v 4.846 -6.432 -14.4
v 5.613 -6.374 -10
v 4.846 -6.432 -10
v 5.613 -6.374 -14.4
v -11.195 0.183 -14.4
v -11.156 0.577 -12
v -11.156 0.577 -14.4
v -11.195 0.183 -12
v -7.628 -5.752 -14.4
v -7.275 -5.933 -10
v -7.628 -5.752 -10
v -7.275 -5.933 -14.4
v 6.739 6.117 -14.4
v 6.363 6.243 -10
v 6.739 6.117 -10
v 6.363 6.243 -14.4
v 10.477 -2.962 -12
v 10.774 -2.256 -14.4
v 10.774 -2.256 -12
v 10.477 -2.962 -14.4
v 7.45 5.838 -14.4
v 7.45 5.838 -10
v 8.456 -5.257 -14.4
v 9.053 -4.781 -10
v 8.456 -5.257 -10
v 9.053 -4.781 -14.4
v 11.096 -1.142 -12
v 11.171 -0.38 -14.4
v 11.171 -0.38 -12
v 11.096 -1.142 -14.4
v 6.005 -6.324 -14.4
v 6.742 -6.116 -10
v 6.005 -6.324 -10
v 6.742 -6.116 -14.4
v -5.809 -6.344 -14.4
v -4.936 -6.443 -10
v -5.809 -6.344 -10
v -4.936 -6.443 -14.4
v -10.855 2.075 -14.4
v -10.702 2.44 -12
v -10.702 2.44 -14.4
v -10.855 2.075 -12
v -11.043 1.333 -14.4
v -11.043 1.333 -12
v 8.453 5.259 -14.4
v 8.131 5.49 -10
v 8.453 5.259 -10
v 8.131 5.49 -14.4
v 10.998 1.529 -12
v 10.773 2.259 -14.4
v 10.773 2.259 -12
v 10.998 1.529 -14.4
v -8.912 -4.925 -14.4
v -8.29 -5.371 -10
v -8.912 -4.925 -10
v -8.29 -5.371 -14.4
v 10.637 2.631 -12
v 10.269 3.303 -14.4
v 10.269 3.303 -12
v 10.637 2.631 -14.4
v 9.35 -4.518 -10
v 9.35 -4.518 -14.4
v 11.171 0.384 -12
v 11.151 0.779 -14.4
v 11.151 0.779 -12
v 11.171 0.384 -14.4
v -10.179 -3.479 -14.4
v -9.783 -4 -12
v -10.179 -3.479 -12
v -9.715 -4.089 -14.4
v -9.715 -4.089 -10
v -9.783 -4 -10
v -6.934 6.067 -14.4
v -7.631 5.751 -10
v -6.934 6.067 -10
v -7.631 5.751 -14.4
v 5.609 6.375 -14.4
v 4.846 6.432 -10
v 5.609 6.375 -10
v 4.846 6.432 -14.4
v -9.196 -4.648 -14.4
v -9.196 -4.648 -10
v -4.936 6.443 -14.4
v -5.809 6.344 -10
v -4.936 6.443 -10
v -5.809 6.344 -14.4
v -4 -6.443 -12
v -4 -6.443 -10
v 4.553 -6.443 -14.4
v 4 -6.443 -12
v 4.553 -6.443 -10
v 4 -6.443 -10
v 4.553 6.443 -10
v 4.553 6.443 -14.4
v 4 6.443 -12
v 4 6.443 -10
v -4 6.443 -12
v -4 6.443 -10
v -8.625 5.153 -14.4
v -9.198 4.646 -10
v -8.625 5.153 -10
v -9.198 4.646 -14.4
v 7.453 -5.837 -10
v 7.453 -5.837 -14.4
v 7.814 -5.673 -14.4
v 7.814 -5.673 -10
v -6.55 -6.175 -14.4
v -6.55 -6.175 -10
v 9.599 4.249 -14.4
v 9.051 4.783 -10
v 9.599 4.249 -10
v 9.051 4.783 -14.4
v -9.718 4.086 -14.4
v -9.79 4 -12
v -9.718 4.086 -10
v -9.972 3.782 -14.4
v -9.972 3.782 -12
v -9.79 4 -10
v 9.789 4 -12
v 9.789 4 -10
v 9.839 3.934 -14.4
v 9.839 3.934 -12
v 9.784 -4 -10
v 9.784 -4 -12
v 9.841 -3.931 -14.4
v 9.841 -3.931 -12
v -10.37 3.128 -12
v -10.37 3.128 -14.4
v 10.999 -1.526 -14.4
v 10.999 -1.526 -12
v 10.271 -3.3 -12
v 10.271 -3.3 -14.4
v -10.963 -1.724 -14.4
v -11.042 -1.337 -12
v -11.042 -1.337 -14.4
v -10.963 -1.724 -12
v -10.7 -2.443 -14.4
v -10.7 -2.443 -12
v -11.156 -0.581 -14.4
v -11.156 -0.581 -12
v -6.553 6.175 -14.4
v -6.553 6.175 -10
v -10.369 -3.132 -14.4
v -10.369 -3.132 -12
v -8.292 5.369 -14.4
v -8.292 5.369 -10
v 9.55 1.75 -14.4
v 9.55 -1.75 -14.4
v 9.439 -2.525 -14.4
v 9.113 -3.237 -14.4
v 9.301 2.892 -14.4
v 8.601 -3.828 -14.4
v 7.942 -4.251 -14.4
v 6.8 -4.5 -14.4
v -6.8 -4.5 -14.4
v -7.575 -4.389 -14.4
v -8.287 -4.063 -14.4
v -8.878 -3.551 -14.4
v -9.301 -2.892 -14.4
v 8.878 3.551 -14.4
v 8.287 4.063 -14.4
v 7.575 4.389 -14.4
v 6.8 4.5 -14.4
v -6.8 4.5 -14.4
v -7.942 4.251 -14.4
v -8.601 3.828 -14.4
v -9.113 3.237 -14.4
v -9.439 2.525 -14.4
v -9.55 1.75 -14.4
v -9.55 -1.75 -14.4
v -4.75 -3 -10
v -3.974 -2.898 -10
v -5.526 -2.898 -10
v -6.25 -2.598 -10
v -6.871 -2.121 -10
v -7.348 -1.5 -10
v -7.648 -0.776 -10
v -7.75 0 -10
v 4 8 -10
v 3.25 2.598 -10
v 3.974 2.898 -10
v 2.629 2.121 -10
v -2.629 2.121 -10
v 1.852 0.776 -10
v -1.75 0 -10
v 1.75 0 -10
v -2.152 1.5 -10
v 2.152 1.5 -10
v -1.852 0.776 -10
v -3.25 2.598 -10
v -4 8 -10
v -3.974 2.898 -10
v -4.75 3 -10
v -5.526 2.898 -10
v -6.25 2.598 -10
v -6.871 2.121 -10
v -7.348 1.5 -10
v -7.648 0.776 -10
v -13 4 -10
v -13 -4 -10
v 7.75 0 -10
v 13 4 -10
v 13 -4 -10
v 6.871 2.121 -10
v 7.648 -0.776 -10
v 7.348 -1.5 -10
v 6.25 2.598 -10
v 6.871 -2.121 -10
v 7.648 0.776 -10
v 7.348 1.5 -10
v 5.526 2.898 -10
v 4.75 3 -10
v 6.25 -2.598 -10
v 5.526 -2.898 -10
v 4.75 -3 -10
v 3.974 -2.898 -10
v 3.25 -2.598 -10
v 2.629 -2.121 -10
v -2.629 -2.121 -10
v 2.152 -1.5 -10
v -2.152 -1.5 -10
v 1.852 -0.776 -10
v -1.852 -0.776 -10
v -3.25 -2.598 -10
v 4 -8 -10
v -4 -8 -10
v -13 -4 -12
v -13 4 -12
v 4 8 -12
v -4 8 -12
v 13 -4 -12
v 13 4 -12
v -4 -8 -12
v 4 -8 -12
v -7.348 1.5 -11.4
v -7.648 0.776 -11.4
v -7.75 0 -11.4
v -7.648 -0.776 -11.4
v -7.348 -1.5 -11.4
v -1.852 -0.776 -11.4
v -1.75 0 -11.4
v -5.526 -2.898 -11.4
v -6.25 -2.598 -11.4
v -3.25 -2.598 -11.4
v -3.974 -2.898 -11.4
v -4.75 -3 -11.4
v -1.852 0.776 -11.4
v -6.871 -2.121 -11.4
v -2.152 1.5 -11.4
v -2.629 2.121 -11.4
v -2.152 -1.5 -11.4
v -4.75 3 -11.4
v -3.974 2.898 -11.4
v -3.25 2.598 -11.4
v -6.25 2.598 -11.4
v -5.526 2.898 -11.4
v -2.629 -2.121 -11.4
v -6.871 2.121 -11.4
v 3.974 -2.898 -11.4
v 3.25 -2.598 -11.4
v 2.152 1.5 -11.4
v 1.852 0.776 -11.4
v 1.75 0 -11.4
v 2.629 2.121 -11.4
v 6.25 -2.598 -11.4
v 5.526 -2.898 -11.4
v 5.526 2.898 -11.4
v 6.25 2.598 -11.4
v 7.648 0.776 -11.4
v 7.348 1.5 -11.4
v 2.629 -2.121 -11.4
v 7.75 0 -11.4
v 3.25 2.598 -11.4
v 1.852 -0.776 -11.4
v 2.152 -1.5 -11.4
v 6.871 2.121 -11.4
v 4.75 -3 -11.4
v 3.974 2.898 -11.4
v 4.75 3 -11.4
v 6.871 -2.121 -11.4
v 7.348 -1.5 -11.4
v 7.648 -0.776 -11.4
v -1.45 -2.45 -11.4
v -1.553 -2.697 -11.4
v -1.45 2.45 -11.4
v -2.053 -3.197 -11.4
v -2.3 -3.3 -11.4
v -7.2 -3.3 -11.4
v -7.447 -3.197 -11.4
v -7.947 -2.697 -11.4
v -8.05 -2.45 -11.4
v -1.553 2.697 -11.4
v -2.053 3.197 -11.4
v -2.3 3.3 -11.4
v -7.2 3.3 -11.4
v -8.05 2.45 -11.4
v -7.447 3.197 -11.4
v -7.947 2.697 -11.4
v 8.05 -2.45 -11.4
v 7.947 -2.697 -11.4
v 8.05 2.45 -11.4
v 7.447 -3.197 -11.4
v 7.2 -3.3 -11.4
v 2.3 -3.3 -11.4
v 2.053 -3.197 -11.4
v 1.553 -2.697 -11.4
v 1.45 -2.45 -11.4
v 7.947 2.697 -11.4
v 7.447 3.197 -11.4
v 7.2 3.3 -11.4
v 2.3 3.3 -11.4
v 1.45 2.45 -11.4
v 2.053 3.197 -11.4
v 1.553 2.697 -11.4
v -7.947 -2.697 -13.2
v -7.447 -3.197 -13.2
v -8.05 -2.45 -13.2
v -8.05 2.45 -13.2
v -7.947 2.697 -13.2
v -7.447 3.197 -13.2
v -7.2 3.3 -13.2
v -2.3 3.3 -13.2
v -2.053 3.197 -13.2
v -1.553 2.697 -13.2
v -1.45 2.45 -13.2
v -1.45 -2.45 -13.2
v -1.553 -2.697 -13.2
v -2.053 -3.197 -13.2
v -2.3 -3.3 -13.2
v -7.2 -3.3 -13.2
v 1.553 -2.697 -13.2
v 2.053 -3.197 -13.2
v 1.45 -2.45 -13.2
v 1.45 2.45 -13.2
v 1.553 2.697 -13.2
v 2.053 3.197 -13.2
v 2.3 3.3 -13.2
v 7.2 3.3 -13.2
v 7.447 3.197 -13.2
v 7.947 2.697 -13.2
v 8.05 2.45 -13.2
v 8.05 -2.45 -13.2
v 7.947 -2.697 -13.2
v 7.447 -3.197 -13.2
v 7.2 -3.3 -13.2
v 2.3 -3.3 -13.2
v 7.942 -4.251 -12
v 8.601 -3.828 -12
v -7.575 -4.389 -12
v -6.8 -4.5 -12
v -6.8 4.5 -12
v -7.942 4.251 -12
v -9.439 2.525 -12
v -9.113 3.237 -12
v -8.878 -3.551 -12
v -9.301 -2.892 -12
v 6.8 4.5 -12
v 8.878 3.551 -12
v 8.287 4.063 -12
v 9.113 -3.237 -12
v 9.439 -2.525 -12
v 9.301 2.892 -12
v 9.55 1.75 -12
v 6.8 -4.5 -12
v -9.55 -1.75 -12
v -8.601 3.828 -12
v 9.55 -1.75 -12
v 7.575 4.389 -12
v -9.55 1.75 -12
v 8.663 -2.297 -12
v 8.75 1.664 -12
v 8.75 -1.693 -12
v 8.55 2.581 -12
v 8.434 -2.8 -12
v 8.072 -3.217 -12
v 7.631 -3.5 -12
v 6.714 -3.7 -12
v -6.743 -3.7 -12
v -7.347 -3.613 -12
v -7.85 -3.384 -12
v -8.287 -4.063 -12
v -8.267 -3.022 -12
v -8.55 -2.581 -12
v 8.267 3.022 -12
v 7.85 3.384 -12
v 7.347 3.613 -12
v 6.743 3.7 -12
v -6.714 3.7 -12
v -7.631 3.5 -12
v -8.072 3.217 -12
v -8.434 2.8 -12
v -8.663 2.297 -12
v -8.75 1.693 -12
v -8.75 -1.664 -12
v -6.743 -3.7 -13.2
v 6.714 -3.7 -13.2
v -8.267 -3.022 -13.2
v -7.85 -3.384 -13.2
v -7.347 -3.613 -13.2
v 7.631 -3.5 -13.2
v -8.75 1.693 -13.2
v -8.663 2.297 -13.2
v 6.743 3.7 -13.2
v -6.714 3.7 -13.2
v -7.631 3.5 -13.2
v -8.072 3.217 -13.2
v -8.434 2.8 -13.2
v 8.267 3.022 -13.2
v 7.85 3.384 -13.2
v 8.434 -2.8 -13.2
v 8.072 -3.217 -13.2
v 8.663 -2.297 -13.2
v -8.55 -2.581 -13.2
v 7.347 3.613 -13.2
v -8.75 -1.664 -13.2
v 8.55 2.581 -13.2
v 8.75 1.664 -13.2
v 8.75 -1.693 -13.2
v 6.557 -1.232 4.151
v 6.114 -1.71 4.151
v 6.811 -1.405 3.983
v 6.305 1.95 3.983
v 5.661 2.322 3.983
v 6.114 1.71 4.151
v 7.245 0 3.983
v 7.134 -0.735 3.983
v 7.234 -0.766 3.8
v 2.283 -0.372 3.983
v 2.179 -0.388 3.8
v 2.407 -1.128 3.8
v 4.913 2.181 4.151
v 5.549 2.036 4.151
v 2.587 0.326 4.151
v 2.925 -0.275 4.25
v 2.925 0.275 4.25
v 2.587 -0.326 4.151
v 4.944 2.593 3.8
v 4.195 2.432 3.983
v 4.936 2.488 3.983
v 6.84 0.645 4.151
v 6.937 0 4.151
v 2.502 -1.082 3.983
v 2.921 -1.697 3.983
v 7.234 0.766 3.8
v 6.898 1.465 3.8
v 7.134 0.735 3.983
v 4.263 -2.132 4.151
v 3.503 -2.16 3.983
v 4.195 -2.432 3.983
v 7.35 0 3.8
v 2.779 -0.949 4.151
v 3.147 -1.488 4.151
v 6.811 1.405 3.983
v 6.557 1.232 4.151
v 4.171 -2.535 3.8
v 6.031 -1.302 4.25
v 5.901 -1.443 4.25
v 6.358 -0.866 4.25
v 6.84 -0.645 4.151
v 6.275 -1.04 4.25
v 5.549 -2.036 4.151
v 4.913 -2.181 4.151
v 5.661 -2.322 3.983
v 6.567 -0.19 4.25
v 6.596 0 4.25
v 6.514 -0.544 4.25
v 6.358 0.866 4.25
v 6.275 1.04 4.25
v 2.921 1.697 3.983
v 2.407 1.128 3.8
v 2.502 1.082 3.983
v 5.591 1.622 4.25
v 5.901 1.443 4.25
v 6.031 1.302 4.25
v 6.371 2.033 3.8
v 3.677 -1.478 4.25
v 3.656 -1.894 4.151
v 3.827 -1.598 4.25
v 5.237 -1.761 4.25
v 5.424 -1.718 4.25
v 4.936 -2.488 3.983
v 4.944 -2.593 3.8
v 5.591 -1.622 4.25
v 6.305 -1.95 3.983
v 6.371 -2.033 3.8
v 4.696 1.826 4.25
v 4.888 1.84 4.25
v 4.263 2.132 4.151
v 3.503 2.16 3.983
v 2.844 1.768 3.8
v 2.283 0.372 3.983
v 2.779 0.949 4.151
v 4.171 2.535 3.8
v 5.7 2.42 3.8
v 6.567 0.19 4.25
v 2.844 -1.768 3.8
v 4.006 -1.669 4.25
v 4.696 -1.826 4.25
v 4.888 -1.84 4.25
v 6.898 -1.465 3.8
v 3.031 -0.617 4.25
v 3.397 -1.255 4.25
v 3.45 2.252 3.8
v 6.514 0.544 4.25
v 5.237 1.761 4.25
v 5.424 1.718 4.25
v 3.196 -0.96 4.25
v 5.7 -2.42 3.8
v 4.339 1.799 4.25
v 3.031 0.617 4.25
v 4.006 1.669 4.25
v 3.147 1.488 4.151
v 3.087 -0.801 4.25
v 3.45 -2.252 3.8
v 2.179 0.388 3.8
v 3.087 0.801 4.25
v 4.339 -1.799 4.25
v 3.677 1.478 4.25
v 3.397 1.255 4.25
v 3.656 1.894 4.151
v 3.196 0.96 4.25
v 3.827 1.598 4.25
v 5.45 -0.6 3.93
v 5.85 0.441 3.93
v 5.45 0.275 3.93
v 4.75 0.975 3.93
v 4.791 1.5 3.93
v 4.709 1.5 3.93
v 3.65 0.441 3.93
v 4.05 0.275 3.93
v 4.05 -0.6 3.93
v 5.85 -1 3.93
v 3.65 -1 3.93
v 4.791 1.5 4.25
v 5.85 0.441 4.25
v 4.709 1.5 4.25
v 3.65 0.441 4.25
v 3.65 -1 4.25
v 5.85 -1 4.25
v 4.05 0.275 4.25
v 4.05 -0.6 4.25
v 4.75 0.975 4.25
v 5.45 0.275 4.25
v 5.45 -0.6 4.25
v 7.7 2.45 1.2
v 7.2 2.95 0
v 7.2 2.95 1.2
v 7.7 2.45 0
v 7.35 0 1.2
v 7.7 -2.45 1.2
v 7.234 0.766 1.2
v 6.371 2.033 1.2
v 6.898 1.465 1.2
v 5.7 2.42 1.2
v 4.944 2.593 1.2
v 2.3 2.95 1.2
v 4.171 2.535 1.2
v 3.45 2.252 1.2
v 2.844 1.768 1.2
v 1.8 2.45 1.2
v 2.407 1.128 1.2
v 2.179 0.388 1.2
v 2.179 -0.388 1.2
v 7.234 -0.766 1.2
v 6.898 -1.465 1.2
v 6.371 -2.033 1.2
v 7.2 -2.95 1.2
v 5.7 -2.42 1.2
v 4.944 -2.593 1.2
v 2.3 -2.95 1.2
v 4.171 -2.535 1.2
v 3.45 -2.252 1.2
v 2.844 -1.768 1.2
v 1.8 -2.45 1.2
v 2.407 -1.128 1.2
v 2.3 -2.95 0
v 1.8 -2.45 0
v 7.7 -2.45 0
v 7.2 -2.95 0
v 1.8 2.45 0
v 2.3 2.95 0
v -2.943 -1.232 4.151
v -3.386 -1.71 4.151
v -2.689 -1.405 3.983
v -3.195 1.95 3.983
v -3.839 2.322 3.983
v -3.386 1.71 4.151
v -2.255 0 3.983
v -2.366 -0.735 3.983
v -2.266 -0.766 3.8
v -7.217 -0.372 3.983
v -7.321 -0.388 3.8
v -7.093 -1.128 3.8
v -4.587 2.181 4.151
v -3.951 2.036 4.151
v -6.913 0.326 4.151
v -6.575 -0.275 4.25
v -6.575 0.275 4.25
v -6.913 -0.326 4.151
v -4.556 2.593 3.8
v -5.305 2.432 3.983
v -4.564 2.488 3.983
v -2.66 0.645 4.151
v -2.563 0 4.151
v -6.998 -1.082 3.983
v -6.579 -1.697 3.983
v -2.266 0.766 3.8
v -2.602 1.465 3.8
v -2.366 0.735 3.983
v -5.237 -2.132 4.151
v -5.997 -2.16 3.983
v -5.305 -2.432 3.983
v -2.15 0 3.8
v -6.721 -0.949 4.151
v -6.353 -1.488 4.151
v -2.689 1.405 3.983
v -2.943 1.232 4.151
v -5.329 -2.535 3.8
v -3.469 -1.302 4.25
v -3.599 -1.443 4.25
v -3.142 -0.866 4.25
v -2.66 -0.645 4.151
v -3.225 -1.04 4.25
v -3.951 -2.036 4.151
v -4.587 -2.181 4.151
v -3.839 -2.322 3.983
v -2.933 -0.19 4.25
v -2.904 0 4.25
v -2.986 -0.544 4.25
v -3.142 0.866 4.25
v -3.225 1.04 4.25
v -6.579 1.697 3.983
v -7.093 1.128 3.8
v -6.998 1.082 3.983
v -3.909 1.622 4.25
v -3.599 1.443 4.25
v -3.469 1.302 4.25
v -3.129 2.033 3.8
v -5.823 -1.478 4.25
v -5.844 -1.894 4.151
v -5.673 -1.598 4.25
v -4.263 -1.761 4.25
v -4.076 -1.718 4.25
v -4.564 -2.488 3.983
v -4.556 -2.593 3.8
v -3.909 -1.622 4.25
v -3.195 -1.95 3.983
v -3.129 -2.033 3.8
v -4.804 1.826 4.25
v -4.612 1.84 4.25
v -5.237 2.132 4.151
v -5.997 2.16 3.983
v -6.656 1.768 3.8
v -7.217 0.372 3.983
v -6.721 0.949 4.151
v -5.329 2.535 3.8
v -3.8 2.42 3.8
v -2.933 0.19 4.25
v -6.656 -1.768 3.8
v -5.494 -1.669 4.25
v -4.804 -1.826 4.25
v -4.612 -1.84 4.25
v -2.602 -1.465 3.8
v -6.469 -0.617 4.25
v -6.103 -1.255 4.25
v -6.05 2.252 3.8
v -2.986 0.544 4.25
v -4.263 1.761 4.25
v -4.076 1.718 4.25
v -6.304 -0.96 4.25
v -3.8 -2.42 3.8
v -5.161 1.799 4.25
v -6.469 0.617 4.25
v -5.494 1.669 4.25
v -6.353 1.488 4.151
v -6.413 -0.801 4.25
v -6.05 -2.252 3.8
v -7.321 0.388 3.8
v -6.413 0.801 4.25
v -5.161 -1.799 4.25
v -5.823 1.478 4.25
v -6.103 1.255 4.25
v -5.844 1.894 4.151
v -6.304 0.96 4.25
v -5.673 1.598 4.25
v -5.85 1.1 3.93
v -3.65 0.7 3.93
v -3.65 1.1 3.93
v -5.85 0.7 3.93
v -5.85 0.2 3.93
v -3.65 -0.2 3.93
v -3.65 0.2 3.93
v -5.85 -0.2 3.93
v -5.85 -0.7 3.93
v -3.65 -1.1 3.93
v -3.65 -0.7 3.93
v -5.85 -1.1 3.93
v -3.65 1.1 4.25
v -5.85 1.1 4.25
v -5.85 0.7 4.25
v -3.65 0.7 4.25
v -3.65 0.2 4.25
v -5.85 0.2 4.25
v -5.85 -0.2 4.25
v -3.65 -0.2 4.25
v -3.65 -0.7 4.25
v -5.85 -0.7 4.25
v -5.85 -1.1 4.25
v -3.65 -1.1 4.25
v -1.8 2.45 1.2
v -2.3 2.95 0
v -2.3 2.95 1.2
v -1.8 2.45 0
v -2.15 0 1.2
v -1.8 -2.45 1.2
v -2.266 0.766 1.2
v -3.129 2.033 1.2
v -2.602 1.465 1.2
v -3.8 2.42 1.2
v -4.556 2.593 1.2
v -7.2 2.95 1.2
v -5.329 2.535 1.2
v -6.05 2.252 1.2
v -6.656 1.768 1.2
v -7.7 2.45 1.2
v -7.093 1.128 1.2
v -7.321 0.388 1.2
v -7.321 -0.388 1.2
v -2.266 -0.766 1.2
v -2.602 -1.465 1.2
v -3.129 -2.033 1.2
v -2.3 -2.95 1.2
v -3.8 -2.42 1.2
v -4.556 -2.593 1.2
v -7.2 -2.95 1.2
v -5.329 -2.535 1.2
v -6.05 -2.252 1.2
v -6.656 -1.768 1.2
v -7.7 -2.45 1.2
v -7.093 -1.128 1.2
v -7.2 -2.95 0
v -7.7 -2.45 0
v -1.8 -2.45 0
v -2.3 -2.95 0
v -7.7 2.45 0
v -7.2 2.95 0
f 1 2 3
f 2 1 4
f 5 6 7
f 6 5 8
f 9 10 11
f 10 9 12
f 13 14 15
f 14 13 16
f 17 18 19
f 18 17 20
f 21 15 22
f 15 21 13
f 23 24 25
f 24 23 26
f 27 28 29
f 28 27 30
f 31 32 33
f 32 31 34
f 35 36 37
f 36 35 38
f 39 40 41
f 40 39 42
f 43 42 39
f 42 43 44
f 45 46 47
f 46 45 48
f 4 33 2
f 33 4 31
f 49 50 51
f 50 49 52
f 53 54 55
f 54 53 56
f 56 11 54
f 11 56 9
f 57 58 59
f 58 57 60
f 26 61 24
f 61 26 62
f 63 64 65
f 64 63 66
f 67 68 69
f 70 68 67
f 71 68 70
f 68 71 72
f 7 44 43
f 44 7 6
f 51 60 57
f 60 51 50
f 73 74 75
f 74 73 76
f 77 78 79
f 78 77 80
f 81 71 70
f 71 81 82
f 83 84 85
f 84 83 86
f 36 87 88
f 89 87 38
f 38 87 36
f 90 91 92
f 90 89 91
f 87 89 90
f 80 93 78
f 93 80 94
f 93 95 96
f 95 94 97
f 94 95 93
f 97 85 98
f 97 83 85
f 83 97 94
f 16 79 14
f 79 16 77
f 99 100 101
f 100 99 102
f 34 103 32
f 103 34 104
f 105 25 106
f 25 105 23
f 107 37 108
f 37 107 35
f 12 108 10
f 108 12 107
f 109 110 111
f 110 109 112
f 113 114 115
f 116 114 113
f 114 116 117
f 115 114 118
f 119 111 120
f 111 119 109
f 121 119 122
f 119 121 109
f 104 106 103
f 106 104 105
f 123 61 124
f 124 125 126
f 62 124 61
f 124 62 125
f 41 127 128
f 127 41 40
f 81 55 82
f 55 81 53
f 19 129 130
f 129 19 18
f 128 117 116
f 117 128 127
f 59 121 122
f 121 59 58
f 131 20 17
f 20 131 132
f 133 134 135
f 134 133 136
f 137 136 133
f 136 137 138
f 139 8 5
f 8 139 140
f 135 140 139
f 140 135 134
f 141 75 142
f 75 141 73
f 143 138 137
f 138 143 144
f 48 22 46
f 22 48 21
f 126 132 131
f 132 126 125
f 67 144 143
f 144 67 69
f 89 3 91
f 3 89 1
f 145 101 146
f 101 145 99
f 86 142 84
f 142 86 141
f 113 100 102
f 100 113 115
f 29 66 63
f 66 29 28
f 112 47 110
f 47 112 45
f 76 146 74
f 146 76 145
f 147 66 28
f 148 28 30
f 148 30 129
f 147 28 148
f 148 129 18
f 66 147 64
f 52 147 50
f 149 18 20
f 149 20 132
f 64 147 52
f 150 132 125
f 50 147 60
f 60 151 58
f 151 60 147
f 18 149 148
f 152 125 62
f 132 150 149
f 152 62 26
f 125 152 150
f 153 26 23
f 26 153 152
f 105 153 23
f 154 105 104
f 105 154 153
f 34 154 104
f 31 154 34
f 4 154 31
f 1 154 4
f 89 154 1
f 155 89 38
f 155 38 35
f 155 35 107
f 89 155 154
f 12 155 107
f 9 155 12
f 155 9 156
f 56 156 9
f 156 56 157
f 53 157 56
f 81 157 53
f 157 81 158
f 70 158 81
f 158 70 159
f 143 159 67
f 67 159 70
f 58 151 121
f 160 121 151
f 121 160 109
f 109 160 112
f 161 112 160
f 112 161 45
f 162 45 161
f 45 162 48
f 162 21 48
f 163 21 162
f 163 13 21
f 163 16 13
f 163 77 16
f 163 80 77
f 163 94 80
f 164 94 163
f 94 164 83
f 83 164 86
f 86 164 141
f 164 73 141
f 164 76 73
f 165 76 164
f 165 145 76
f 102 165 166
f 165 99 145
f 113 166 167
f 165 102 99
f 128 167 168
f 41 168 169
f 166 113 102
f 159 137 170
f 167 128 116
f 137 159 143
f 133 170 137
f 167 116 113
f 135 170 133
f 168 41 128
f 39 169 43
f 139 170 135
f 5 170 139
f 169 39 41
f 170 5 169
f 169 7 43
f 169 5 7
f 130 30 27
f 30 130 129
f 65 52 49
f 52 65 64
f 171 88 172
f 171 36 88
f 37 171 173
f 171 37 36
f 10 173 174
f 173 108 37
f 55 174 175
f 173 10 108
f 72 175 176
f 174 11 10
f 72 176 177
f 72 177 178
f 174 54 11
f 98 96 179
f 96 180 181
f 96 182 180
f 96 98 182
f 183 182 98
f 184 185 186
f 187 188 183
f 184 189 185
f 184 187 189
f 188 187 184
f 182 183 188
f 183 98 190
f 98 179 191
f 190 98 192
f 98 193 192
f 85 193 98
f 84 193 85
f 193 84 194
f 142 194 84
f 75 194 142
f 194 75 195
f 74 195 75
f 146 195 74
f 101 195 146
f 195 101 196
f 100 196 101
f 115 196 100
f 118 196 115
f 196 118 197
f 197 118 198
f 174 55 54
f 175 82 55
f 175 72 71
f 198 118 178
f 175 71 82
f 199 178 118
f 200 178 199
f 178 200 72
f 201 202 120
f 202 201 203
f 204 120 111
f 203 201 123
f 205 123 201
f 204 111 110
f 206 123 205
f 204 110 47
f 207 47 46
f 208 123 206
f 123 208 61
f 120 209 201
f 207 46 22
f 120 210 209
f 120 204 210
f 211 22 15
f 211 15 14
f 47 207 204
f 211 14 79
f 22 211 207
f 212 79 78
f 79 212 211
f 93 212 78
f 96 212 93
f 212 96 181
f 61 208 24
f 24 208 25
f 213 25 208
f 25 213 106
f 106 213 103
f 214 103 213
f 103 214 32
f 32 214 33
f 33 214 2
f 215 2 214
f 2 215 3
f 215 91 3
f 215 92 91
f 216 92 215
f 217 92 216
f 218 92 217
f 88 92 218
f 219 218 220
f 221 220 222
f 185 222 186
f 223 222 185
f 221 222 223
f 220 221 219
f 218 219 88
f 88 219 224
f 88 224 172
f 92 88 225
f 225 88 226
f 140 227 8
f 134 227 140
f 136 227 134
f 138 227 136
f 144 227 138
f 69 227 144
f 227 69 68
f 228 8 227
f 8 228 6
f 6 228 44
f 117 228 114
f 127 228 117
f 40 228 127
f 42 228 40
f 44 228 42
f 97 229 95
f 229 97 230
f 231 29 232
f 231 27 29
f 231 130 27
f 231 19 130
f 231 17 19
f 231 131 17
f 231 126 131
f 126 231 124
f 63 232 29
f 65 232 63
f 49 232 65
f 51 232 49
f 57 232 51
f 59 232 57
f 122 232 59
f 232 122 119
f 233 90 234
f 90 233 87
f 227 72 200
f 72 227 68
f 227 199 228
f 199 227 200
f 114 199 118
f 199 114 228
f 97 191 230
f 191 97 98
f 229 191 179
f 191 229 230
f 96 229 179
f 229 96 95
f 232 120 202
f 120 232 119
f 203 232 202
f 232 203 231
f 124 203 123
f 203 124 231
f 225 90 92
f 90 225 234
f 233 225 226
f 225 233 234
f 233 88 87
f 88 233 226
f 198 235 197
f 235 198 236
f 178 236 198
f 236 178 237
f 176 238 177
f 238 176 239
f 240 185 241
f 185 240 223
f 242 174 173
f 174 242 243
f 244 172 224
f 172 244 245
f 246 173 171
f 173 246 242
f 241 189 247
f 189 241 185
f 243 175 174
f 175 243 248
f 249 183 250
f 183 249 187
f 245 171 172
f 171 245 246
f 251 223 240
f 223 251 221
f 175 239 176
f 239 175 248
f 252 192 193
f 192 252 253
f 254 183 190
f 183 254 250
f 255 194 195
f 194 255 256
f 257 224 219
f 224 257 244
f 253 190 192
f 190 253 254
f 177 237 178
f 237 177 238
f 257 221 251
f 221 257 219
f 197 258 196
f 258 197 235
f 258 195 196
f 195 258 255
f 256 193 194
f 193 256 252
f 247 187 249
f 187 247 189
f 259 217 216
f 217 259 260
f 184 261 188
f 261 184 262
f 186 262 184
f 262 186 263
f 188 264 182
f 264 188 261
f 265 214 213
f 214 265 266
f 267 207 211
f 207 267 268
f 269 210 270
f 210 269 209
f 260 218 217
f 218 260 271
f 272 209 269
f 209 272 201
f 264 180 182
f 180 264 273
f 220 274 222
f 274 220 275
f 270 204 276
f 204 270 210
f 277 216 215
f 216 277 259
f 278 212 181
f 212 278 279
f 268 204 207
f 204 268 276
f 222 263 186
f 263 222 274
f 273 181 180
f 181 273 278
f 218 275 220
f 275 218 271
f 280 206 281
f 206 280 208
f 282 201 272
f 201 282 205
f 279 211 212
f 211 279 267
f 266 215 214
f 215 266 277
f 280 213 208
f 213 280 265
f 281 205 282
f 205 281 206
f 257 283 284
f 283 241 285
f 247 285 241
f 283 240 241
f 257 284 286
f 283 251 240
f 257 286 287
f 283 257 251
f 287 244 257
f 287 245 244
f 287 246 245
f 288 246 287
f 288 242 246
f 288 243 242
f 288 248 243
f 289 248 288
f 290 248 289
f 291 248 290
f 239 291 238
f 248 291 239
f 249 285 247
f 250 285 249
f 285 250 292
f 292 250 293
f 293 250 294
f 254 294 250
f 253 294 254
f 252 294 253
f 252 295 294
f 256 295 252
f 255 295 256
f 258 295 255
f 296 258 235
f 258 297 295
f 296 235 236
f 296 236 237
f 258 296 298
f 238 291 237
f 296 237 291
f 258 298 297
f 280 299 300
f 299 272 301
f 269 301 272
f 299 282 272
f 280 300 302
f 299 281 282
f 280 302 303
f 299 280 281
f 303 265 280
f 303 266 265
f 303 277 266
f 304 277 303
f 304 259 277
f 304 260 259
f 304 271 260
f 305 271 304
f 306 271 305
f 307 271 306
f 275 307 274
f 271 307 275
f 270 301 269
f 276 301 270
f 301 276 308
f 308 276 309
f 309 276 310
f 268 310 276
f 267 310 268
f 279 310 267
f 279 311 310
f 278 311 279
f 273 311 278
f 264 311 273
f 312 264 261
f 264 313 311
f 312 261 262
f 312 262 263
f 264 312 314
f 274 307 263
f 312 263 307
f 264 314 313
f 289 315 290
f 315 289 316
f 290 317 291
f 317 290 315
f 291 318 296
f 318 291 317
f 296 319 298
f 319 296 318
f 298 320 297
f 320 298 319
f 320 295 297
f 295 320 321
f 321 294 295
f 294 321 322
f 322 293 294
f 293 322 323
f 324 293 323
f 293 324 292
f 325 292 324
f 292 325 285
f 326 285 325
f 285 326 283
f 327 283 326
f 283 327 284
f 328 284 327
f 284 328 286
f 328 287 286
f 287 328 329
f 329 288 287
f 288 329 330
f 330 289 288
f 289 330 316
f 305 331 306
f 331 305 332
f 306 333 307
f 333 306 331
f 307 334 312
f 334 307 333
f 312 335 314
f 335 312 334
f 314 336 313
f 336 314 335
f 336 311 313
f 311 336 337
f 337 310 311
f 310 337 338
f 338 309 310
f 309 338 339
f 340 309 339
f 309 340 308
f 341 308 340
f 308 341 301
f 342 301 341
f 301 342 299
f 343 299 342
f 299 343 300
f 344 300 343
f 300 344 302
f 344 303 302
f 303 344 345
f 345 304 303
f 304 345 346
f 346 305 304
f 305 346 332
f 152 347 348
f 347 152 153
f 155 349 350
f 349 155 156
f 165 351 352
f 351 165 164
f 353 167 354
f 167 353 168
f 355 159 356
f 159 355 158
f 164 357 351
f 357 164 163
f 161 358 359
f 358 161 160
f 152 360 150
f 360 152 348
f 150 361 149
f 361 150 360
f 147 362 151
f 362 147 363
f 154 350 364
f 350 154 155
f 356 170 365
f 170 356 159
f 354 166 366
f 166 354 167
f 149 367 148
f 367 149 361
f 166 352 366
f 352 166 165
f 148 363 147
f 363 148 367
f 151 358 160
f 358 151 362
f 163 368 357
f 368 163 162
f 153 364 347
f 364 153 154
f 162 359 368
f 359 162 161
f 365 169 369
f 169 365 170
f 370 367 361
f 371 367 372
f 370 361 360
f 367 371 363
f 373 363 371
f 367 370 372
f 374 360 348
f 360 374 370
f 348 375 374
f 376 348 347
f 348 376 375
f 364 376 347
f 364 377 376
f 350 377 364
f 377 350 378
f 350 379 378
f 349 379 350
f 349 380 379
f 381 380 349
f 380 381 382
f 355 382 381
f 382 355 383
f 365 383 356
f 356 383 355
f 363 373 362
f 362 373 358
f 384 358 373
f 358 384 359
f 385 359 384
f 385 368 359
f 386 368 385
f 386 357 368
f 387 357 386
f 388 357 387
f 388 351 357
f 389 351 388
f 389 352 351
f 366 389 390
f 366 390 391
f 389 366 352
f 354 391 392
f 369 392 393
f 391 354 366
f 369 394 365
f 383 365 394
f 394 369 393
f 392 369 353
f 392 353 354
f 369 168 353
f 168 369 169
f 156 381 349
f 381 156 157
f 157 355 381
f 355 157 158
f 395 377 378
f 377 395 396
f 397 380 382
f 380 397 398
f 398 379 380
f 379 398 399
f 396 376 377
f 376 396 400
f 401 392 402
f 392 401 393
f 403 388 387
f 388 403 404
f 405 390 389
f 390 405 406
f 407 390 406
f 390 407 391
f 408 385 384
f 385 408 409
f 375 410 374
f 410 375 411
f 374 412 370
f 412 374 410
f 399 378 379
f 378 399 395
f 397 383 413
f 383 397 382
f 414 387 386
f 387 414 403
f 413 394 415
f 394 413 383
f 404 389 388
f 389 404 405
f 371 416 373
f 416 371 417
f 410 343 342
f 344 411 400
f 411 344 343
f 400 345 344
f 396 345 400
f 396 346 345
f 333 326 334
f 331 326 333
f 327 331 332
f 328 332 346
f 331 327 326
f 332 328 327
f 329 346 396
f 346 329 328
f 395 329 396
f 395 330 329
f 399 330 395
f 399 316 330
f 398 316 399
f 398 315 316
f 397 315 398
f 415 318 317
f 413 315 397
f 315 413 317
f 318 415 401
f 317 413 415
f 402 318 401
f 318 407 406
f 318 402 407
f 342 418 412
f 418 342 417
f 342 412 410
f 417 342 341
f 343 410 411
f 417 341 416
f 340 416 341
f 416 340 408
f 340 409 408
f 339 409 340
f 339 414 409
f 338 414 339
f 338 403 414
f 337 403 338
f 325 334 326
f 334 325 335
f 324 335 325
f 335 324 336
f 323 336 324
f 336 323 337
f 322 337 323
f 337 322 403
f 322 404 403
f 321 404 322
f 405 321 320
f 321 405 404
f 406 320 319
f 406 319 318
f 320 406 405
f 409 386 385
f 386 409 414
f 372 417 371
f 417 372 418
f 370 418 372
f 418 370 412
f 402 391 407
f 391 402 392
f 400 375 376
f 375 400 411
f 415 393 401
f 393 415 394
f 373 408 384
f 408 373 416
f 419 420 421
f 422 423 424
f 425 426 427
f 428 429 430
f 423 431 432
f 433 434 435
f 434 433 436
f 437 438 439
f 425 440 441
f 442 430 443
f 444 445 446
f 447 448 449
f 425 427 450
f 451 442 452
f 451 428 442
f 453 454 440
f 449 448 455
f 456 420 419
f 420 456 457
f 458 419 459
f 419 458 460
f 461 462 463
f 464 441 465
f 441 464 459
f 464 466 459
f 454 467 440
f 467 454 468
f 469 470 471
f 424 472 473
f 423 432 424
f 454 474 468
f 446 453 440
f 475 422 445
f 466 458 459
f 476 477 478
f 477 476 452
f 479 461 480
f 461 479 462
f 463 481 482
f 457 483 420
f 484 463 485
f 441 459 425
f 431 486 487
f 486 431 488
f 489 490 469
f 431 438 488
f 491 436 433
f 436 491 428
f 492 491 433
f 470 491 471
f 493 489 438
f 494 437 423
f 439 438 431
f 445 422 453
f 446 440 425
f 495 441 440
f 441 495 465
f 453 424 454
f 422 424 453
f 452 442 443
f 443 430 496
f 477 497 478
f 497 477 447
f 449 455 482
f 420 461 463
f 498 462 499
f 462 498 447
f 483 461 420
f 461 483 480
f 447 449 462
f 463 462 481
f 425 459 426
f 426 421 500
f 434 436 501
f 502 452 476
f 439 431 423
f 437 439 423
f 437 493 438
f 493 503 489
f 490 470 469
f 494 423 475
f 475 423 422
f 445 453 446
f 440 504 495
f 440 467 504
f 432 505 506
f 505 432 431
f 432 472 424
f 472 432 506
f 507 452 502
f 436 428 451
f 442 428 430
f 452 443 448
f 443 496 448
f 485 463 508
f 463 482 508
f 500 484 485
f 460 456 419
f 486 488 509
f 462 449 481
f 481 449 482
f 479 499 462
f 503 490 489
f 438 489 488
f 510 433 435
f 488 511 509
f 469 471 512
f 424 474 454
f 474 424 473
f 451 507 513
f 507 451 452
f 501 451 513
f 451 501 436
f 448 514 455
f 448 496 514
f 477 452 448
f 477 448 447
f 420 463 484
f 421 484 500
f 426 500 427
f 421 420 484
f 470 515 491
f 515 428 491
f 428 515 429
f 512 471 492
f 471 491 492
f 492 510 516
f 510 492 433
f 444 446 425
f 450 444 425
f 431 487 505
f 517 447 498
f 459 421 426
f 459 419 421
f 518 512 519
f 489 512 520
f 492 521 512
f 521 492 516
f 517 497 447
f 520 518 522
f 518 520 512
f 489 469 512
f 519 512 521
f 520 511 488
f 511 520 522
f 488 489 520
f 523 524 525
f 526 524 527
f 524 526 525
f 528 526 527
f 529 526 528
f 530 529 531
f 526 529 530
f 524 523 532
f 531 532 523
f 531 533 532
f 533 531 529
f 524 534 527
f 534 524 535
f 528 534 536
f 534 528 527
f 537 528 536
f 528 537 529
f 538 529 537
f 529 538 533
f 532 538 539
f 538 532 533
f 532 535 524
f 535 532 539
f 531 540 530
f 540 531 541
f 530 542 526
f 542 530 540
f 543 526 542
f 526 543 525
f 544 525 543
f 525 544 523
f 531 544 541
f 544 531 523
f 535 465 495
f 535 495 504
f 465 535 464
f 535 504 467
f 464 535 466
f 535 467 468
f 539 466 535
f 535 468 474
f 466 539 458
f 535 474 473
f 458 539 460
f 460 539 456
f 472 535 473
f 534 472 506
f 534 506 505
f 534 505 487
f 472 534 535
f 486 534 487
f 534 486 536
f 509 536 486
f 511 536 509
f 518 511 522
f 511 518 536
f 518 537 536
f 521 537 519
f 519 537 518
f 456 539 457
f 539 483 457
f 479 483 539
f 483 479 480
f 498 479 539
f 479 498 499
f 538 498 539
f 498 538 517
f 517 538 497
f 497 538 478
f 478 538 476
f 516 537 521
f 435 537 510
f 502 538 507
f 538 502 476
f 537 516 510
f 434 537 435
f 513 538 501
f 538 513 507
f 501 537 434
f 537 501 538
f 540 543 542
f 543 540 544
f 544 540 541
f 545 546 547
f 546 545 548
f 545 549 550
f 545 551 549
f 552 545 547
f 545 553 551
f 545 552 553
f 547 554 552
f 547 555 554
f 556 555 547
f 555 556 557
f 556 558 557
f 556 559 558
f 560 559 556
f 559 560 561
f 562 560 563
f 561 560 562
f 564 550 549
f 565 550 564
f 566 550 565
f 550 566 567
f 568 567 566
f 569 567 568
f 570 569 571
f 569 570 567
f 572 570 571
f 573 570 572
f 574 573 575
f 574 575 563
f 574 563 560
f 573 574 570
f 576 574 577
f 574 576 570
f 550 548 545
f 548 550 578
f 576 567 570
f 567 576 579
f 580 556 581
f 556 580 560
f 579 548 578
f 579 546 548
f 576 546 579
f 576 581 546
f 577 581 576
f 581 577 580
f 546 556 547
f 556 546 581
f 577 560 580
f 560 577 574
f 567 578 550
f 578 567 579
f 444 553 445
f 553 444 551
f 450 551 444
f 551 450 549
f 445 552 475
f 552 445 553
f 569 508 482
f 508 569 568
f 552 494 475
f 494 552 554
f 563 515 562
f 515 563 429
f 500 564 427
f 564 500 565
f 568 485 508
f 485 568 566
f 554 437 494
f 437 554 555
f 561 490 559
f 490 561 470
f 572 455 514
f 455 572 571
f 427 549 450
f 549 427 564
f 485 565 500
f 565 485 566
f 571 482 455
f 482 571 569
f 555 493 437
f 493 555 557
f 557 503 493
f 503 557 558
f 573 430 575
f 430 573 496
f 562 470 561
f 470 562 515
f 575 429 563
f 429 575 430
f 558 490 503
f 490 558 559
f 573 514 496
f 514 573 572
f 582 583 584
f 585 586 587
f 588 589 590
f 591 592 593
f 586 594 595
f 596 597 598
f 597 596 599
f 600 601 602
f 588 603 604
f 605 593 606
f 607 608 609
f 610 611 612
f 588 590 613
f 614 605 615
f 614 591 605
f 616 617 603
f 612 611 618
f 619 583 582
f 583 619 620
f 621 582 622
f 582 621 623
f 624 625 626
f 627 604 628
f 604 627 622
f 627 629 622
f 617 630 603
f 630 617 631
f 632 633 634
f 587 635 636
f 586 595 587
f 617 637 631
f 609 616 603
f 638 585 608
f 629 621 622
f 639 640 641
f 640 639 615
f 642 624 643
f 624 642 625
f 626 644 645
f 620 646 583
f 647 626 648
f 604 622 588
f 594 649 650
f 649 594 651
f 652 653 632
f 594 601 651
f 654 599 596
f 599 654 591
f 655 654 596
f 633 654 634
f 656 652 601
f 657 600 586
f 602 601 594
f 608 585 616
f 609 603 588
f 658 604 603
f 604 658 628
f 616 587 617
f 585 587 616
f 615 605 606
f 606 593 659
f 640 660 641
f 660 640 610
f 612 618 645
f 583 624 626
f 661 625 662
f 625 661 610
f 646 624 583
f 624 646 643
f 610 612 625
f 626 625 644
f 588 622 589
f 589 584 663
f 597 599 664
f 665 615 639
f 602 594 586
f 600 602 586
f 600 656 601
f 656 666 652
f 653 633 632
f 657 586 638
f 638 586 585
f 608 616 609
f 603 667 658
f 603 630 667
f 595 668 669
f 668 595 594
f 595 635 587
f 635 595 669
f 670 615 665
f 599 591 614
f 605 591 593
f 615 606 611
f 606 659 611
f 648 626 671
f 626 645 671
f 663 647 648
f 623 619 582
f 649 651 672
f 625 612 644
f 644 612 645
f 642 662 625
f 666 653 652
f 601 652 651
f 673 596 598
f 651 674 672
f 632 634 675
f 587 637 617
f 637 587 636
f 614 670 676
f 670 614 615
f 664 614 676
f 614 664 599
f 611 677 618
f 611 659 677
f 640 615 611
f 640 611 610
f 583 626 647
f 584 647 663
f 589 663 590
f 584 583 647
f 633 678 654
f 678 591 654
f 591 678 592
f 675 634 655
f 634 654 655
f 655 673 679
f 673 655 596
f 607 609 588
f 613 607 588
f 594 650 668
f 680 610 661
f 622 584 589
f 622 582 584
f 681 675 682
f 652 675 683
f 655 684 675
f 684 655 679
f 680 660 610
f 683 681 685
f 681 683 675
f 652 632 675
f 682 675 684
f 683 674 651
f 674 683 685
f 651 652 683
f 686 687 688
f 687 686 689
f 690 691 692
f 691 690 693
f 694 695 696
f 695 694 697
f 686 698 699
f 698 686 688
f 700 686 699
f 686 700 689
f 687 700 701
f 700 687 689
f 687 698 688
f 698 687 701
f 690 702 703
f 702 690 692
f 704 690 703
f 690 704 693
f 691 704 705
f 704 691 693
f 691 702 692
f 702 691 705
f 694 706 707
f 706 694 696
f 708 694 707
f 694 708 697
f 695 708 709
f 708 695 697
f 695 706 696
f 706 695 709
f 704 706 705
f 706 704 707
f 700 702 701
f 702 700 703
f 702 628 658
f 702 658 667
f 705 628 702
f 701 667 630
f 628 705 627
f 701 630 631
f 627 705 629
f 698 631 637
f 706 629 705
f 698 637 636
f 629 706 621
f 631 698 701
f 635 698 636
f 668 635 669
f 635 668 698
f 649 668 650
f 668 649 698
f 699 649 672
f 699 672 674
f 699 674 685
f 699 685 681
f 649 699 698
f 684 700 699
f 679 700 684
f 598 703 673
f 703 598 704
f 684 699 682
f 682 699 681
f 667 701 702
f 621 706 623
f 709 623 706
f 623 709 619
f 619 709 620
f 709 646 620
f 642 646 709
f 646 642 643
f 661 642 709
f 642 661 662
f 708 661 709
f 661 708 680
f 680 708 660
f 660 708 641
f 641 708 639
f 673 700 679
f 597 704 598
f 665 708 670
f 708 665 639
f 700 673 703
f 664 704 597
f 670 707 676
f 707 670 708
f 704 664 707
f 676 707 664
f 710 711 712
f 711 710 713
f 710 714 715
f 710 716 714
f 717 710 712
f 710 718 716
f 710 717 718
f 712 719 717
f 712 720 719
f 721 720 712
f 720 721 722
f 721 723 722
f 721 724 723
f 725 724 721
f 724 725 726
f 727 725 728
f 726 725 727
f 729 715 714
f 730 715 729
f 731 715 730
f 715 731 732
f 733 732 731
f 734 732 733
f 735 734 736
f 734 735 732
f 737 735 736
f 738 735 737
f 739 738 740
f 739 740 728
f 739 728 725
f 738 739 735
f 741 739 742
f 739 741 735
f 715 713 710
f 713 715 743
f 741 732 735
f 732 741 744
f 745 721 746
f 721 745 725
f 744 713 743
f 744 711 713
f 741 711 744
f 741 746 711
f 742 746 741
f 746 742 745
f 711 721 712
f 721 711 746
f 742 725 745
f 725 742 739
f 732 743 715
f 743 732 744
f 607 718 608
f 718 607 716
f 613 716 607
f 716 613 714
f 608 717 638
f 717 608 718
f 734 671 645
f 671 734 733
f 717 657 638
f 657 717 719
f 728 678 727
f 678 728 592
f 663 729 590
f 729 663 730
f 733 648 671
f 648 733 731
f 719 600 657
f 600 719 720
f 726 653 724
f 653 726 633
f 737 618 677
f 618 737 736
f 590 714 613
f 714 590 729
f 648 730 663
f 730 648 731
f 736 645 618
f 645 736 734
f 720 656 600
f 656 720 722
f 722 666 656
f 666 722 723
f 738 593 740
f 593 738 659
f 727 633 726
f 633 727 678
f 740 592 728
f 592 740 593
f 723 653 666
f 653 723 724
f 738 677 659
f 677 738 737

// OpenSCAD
// file: buttons.scad
// Copyright 2019 a.j.buxton@gmail.com
// CC BY-NC-ND 4.0

include <common.scad>;



module button_positions() {
    positions = [[16.8/2, 0], [0, -16/2], [0, 16/2],   [-16.8/2, 0]];
    for($which = [0:3]) translate(positions[$which]) children();
}


module rubber() {
    positions = [[16/2, 0], [0, -15.5/2], [0, 15.5/2],   [-16/2, 0]];
    hull() {
        for($which = [0, 3]) translate(positions[$which]) children();
    }
    hull() {
        for($which = [1, 2]) translate(positions[$which]) children();
    }

}



module button_base() {

    difference() {
        circle(d=10);
        rotate(button_rotations[$which]) {
            translate([9.5, 0, 0]) square(10, center=true);
            translate([-9.3, 0, 0]) square(10, center=true);

            translate([-2.3, 0, 0]) {
                    translate([0, 4.5, 0]) circle(d=1.5);
                    translate([0, -4.5, 0]) circle(d=1.5);
            }
        }
    }

}


module text_offset(amt) {
    offset(amt) offset(amt) offset(-amt) children();
}


module button_top(r, label="?") {
    difference() {
        scale([1, 1, 0.25]) sphere(r=r);
        if (label != " ") {
            translate([0, 0, r*0.08]) linear_extrude(height=10, convexity=4) text_offset(0.2*r/button_radius) text(label, size=4*r/button_radius, halign="center", valign="center");
            translate([0, 0, 5.75]) cube([10, 10, 10], center=true);
        }
    }
}


module button(letter=true, hole=false) {
    color(button_colours[$which]) {
        difference() {
            union() {
                linear_extrude(height=1.2) button_base();
                cylinder(r=button_radius, h=button_height);
                if (letter) {
                    translate([0, 0, button_height-0.0]) button_top(button_radius, button_letters[$which]);
                } else {
                    translate([0, 0, button_height-0.0]) button_top(button_radius, " ");
                }
            }
            if (hole) translate([0, 0, -0.01]) cylinder(d=1.8, h=3);
        }
    }
}

module buttons() {
    button_positions() button();
}


module button_insert() {
    front_thickness = 2;
    difference() {
        union() {
            base_insert(front_thickness);
            translate([0, 0, front_thickness]) linear_extrude(height=1.2, convexity=2) offset(1) rubber() button_base();
        }

        translate([0, 0, -5.1]) button_positions() cylinder(r=button_radius+0.4, h=20);
        translate([0, 0, 1.4]) {
            linear_extrude(height=10, convexity=4) button_positions() offset(0.35) button_base();
            translate([0, 0, 1.6]) cube([5.7, 4.8, 3], center=true);
        }
    }
}


RES = is_undef(RES) ? 1 : RES;

$fa = 8/RES; $fs = 2/RES;


WHICH = undef;
HOLE = undef;

if (WHICH == "A") {
    button(hole = HOLE, $which = 0);
}
else if (WHICH == "B") {
    button(hole = HOLE, $which = 1);
}
else if (WHICH == "X") {
    button(hole = HOLE, $which = 2);
}
else if (WHICH == "Y") {
    button(hole = HOLE, $which = 3);
}
else if (WHICH == "blank") {
    button(letter = false, hole = HOLE, $which = 0);
}
else if (WHICH == "insert") {
    button_insert();
}
else if (1) {
    translate([0, 0, 3]) rotate([0, 180, 0]) button_insert();
    button_positions() button();
}
// file: common.scad
// Copyright 2019 a.j.buxton@gmail.com
// CC BY-NC-ND 4.0

w = 151;
h = 65;


// abxy and dpad holes
button_hole_diameter = 29;
// analog stick
analog_hole_diameter = 21;

button_radius = 8.4/2;
button_height = 4.5;

button_letters = ["A", "B", "X", "Y"];
button_rotations = [180, 90, 270, 0];
button_colours = [[1.0, 0.1, 0.1], [1, 0.8, 0], [0.1, 0.3, 1], [0, 0.8, 0]];


small_button_radius = 5.2/2;
small_button_height = 3.8;
small_button_letters = ["H", "M"];
small_button_rotations = [180, 0];


module twobytwo() {
    children();
    rotate(90) children();
    rotate(180) children();
    rotate(270) children();
}


module mirrorf() {
    children();
    mirror([1, 0]) children();
    mirror([0, 1]) children();
    mirror([1, 0]) mirror([0, 1]) children();
}


module base_insert(thickness, extra=0) {
    translate([0, 0, -extra]) cylinder(d=button_hole_diameter-0.5, h=thickness+extra);
    linear_extrude(height=thickness, convexity=2) {
        square([7.9, 30], center=true);
        square([30, 7.9], center=true);
    }
    twobytwo() translate([6.9, 6.9, 0]) intersection() {
        cylinder(r=4.4, h=4.4);
        cube(10);
    }
    if (extra > 0) twobytwo() {
        translate([15, -4, -extra]) cube([1, 8, extra+2]);
    }
}

module outline() {
    offset(3) offset(-3) square([w, h], center=true);
}


module support() {
    scale(0.3) translate([-5, -9.5]) intersection() {
        cube(10);
        rotate([-45, 0, 0]) cube(20);
    }
}


module shell(height=7.6) {
    difference() {
        linear_extrude(height=height, convexity=2) difference() {
            offset(1.6) outline();
            offset(-0.05) outline();
        }
        translate([0, 0, height-1.6]) linear_extrude(height=height, convexity=2) {
            translate([20.8, 1, 0]) offset(1.1, $fn=2) offset(-1.1) square([39, h], center=true);
        }
    }
}


module dpad_pos() {
    translate([(w/2)-18.5, -8.75]) children();
}

module analog_pos() {
    translate([(w/2)-18.5, 20.25]) children();
}

module analog_supports() {
    translate([6.9, 9.28]) children();
    translate([-11.2, -6.68]) children();
}

module btn_pos() {
    translate([-57.9, 7.9]) children();
}

module smlbtn_pos() {
    translate([-57.9, -19.75]) children();
}

module led_pos() {
    translate([-57.9, 27]) {
        children();
    }
}

module led_individual_pos() {
    led_pos() {
        translate([3.9, 0]) children();
        //translate([0, 0]) children();
        translate([-3.9, 0]) children();
    }
}

module screw_pos(internal=true) {
    translate([0, 0.2, 0]) {
        translate([144/2, 0]) {
            translate([0, -29]) children();
            if (internal) translate([0, 0]) children();
            translate([0, 29]) rotate(90) children();
            if (internal) translate([-29, 0]) {
                translate([0, -29]) children();
                //translate([0, 0]) children();
                translate([0, 29]) children();
            }
        }
        translate([-145/2, 0]) {
            translate([0, -29]) rotate(270) children();
            if (internal) translate([0, 0]) children();
            translate([0, 29]) rotate(180) children();
            if (internal) translate([29, 0]) {
                translate([0, -29]) children();
                //translate([0, 0]) children();
                translate([0, 29]) children();
            }
        }
    }
}
// main file
// Copyright 2019 a.j.buxton@gmail.com
// CC BY-NC-ND 4.0


include <common.scad>;

use <buttons.scad>;


module small_button_positions() {
    positions = [[9.5/2, 0], [-9.5/2, 0]];
    for($which = [0:1]) translate(positions[$which]) children();
}

module small_button_hole() {
    offset(r=4) hull() small_button_positions() circle(d=5.2);
}

module small_rubber() {
    offset(2.75) offset(-2.75) square([19.1, 9], center=true);

}


module small_button_base() {
    difference() {
        offset(0.5) offset(-0.5) square(5.9, center=true);
    }
}


module small_button_top(r, label="?") {
    difference() {
        scale([1, 1, 0.25]) sphere(r=r);
        translate([0, 0, r*0.05]) linear_extrude(height=10, convexity=4) {
            if (label == 0) {
                difference() {
                    intersection() {
                        translate([0, 0.25]) square([2.2, 2.5], center=true);
                        translate([0, -1.5]) rotate(45) square(4.3, center=true);
                    }
                    offset(-0.4)intersection() {
                        translate([0, 0.25]) square([2.2, 2.5], center=true);
                        translate([0, -1.5]) rotate(45) square(4.3, center=true);
                    }
                }
            } else {
                square([2.2, 0.4], center=true);
                translate([0, 0.9]) square([2.2, 0.4], center=true);
                translate([0, -0.9]) square([2.2, 0.4], center=true);
            }
        }
        translate([0, 0, 5.45]) cube([10, 10, 10], center=true);
    }
}


module small_button(hole=false) {
    color("lightgrey") {
        difference() {
            union() {
                linear_extrude(height=1.2) small_button_base();
                cylinder(r=small_button_radius, h=small_button_height);
                // for letters
                //translate([0, 0, small_button_height-0.0]) button_top(small_button_radius, small_button_letters[$which]);
                // for icons
                translate([0, 0, small_button_height-0.0]) small_button_top(small_button_radius, $which);
            }
            if (hole) translate([0, 0, -0.01]) cylinder(d=1.8, h=3);
        }
    }
}

module small_buttons() {
    small_button_positions() small_button();
}



module small_button_insert() {
    front_thickness = 2;
    difference() {
        union() {
            linear_extrude(height=4.4) offset(r=-0.15) small_button_hole();
            linear_extrude(height=front_thickness, convexity=2) {
                square([8, 16], center=true);
                square([26, 8], center=true);
            }
        }
//        linear_extrude(height=4.4, convexity=2) offset(2) offset(-2) square([19, 9], center=true);
        translate([0, 0, -0.1]) small_button_positions() cylinder(r=small_button_radius+0.4, h=10);
        translate([0, 0, 1.4]) {
            linear_extrude(height=10, convexity=4) small_button_positions() offset(0.35) small_button_base();
        }
        translate([0, 0, 2]) linear_extrude(height=20, convexity=2) small_rubber();
    }

    difference() {
        translate([0, 0, 1]) linear_extrude(height=2.2, convexity=2) offset(-0.8) small_rubber();
        linear_extrude(height=10, convexity=2) small_button_positions() offset(0.35) small_button_base();
        //linear_extrude(height=10) offset(-1.5) small_rubber();

    }
}


RES = is_undef(RES) ? 1 : RES;

$fa = 8/RES; $fs = 0.8/RES;


WHICH = undef;
HOLE = undef;

if (WHICH == "H") {
    small_button(hole = HOLE, $which = 0);
}
else if (WHICH == "M") {
    small_button(hole = HOLE, $which = 1);
}
else if (WHICH == "insert") {
    small_button_insert();
}
else if (1) {
    translate([0, 0, -10]) rotate([0, 180, 0]) small_button_insert();
    small_button_positions() small_button();
}
